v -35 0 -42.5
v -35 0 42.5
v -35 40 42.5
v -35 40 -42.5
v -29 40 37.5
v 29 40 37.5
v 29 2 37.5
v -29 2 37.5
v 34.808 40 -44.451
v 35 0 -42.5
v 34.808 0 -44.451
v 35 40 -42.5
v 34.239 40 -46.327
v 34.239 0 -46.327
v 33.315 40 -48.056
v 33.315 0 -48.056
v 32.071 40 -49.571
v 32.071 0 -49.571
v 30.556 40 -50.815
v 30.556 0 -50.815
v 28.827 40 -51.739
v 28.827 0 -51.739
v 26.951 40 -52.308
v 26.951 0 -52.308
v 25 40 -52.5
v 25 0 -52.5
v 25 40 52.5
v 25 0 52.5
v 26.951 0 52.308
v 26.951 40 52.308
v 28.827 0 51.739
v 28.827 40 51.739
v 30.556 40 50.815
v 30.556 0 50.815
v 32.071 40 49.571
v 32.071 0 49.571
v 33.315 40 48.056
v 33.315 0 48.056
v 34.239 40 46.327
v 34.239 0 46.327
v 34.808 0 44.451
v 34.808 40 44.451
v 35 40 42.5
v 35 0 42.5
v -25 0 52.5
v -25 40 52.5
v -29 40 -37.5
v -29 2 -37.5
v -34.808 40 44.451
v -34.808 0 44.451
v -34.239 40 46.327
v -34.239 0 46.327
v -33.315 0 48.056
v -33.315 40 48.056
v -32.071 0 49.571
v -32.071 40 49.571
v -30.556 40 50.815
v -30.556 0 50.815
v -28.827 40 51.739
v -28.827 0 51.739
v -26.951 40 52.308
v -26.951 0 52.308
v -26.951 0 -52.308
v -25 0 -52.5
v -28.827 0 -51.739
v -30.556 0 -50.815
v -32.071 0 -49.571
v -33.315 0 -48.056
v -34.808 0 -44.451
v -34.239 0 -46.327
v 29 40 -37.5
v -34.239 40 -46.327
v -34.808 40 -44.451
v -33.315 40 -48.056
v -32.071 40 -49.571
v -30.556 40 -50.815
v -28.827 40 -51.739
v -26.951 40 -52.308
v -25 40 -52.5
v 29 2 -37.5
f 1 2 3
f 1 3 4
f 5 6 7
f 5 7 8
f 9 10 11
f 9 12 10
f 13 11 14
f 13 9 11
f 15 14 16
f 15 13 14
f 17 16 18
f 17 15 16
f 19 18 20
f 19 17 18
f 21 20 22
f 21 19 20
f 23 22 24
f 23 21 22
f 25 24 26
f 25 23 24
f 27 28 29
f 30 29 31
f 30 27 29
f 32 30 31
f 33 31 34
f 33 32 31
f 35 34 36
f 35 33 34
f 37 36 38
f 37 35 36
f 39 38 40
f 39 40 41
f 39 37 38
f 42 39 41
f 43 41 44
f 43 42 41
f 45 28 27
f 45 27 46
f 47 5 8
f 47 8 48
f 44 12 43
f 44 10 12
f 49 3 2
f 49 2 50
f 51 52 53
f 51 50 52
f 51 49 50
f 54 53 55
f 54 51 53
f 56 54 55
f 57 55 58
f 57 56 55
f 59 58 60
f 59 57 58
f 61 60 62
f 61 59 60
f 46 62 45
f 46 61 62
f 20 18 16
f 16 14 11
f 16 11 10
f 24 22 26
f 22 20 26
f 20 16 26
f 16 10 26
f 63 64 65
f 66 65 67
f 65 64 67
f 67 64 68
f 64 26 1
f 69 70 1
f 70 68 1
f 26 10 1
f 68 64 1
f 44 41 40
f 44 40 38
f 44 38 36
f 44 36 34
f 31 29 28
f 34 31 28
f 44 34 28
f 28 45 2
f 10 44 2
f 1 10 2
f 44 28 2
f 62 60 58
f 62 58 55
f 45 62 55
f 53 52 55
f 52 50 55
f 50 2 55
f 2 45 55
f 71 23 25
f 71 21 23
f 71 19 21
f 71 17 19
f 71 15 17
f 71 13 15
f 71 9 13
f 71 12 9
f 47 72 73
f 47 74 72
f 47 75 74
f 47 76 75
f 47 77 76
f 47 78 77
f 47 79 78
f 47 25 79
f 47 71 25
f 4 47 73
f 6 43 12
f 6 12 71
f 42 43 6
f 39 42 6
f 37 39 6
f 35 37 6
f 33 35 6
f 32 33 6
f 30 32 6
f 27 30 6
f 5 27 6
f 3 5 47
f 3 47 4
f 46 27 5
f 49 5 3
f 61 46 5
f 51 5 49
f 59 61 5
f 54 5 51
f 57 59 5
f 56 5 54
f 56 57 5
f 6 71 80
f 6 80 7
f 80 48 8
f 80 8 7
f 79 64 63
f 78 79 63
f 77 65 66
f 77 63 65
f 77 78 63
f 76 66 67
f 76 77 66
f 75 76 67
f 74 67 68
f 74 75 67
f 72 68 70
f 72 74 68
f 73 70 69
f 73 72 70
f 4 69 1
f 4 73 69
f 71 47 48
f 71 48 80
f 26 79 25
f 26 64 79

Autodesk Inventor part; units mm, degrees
ref_plane "XZ Plane" through (0, 0, 0) normal (0, 1, 0) x (-1, 0, 0)
ref_plane "XY Plane" through (0, 0, 0) normal (0, 0, 1) x (1, 0, 0)
sketch "Sketch1" plane through (0, 0, 0) normal (0, 1, 0) x (-1, 0, 0)
  line L0 (-35, 52.5) -> (35, 52.5)
  line L1 (35, 52.5) -> (35, -52.5)
  line L2 (35, -52.5) -> (-35, -52.5)
  line L3 (-35, -52.5) -> (-35, 52.5)
  line L4 (-35, 52.5) -> (35, -52.5) construction
  line L5 (35, 52.5) -> (-35, -52.5) construction
  point P0 (0, 0)
  dimension "d0" = 105
  dimension "d1" = 70
extrude "Extrusion1" add sketch "Sketch1" along normal blind 40
fillet "Fillet1" radius 10 4 edges at (-35, 20, 52.5) (35, 20, 52.5) (-35, 20, -52.5) (35, 20, -52.5)
sketch "Sketch2" plane through (0, 40, 0) normal (0, 1, 0) x (1, 0, 0)
  line L0 (29, -37.5) -> (-29, -37.5)
  line L1 (-29, -37.5) -> (-29, 37.5)
  line L2 (-29, 37.5) -> (29, 37.5)
  line L3 (29, 37.5) -> (29, -37.5)
  line L4 (29, -37.5) -> (-29, 37.5) construction
  line L5 (-29, -37.5) -> (29, 37.5) construction
  point P0 (0, 0)
  dimension "d5" = 58
  dimension "d6" = 75
extrude "Extrusion2" cut sketch "Sketch2" against normal blind 38
properties part number "CH_01_0038_kradex_place_holder"
